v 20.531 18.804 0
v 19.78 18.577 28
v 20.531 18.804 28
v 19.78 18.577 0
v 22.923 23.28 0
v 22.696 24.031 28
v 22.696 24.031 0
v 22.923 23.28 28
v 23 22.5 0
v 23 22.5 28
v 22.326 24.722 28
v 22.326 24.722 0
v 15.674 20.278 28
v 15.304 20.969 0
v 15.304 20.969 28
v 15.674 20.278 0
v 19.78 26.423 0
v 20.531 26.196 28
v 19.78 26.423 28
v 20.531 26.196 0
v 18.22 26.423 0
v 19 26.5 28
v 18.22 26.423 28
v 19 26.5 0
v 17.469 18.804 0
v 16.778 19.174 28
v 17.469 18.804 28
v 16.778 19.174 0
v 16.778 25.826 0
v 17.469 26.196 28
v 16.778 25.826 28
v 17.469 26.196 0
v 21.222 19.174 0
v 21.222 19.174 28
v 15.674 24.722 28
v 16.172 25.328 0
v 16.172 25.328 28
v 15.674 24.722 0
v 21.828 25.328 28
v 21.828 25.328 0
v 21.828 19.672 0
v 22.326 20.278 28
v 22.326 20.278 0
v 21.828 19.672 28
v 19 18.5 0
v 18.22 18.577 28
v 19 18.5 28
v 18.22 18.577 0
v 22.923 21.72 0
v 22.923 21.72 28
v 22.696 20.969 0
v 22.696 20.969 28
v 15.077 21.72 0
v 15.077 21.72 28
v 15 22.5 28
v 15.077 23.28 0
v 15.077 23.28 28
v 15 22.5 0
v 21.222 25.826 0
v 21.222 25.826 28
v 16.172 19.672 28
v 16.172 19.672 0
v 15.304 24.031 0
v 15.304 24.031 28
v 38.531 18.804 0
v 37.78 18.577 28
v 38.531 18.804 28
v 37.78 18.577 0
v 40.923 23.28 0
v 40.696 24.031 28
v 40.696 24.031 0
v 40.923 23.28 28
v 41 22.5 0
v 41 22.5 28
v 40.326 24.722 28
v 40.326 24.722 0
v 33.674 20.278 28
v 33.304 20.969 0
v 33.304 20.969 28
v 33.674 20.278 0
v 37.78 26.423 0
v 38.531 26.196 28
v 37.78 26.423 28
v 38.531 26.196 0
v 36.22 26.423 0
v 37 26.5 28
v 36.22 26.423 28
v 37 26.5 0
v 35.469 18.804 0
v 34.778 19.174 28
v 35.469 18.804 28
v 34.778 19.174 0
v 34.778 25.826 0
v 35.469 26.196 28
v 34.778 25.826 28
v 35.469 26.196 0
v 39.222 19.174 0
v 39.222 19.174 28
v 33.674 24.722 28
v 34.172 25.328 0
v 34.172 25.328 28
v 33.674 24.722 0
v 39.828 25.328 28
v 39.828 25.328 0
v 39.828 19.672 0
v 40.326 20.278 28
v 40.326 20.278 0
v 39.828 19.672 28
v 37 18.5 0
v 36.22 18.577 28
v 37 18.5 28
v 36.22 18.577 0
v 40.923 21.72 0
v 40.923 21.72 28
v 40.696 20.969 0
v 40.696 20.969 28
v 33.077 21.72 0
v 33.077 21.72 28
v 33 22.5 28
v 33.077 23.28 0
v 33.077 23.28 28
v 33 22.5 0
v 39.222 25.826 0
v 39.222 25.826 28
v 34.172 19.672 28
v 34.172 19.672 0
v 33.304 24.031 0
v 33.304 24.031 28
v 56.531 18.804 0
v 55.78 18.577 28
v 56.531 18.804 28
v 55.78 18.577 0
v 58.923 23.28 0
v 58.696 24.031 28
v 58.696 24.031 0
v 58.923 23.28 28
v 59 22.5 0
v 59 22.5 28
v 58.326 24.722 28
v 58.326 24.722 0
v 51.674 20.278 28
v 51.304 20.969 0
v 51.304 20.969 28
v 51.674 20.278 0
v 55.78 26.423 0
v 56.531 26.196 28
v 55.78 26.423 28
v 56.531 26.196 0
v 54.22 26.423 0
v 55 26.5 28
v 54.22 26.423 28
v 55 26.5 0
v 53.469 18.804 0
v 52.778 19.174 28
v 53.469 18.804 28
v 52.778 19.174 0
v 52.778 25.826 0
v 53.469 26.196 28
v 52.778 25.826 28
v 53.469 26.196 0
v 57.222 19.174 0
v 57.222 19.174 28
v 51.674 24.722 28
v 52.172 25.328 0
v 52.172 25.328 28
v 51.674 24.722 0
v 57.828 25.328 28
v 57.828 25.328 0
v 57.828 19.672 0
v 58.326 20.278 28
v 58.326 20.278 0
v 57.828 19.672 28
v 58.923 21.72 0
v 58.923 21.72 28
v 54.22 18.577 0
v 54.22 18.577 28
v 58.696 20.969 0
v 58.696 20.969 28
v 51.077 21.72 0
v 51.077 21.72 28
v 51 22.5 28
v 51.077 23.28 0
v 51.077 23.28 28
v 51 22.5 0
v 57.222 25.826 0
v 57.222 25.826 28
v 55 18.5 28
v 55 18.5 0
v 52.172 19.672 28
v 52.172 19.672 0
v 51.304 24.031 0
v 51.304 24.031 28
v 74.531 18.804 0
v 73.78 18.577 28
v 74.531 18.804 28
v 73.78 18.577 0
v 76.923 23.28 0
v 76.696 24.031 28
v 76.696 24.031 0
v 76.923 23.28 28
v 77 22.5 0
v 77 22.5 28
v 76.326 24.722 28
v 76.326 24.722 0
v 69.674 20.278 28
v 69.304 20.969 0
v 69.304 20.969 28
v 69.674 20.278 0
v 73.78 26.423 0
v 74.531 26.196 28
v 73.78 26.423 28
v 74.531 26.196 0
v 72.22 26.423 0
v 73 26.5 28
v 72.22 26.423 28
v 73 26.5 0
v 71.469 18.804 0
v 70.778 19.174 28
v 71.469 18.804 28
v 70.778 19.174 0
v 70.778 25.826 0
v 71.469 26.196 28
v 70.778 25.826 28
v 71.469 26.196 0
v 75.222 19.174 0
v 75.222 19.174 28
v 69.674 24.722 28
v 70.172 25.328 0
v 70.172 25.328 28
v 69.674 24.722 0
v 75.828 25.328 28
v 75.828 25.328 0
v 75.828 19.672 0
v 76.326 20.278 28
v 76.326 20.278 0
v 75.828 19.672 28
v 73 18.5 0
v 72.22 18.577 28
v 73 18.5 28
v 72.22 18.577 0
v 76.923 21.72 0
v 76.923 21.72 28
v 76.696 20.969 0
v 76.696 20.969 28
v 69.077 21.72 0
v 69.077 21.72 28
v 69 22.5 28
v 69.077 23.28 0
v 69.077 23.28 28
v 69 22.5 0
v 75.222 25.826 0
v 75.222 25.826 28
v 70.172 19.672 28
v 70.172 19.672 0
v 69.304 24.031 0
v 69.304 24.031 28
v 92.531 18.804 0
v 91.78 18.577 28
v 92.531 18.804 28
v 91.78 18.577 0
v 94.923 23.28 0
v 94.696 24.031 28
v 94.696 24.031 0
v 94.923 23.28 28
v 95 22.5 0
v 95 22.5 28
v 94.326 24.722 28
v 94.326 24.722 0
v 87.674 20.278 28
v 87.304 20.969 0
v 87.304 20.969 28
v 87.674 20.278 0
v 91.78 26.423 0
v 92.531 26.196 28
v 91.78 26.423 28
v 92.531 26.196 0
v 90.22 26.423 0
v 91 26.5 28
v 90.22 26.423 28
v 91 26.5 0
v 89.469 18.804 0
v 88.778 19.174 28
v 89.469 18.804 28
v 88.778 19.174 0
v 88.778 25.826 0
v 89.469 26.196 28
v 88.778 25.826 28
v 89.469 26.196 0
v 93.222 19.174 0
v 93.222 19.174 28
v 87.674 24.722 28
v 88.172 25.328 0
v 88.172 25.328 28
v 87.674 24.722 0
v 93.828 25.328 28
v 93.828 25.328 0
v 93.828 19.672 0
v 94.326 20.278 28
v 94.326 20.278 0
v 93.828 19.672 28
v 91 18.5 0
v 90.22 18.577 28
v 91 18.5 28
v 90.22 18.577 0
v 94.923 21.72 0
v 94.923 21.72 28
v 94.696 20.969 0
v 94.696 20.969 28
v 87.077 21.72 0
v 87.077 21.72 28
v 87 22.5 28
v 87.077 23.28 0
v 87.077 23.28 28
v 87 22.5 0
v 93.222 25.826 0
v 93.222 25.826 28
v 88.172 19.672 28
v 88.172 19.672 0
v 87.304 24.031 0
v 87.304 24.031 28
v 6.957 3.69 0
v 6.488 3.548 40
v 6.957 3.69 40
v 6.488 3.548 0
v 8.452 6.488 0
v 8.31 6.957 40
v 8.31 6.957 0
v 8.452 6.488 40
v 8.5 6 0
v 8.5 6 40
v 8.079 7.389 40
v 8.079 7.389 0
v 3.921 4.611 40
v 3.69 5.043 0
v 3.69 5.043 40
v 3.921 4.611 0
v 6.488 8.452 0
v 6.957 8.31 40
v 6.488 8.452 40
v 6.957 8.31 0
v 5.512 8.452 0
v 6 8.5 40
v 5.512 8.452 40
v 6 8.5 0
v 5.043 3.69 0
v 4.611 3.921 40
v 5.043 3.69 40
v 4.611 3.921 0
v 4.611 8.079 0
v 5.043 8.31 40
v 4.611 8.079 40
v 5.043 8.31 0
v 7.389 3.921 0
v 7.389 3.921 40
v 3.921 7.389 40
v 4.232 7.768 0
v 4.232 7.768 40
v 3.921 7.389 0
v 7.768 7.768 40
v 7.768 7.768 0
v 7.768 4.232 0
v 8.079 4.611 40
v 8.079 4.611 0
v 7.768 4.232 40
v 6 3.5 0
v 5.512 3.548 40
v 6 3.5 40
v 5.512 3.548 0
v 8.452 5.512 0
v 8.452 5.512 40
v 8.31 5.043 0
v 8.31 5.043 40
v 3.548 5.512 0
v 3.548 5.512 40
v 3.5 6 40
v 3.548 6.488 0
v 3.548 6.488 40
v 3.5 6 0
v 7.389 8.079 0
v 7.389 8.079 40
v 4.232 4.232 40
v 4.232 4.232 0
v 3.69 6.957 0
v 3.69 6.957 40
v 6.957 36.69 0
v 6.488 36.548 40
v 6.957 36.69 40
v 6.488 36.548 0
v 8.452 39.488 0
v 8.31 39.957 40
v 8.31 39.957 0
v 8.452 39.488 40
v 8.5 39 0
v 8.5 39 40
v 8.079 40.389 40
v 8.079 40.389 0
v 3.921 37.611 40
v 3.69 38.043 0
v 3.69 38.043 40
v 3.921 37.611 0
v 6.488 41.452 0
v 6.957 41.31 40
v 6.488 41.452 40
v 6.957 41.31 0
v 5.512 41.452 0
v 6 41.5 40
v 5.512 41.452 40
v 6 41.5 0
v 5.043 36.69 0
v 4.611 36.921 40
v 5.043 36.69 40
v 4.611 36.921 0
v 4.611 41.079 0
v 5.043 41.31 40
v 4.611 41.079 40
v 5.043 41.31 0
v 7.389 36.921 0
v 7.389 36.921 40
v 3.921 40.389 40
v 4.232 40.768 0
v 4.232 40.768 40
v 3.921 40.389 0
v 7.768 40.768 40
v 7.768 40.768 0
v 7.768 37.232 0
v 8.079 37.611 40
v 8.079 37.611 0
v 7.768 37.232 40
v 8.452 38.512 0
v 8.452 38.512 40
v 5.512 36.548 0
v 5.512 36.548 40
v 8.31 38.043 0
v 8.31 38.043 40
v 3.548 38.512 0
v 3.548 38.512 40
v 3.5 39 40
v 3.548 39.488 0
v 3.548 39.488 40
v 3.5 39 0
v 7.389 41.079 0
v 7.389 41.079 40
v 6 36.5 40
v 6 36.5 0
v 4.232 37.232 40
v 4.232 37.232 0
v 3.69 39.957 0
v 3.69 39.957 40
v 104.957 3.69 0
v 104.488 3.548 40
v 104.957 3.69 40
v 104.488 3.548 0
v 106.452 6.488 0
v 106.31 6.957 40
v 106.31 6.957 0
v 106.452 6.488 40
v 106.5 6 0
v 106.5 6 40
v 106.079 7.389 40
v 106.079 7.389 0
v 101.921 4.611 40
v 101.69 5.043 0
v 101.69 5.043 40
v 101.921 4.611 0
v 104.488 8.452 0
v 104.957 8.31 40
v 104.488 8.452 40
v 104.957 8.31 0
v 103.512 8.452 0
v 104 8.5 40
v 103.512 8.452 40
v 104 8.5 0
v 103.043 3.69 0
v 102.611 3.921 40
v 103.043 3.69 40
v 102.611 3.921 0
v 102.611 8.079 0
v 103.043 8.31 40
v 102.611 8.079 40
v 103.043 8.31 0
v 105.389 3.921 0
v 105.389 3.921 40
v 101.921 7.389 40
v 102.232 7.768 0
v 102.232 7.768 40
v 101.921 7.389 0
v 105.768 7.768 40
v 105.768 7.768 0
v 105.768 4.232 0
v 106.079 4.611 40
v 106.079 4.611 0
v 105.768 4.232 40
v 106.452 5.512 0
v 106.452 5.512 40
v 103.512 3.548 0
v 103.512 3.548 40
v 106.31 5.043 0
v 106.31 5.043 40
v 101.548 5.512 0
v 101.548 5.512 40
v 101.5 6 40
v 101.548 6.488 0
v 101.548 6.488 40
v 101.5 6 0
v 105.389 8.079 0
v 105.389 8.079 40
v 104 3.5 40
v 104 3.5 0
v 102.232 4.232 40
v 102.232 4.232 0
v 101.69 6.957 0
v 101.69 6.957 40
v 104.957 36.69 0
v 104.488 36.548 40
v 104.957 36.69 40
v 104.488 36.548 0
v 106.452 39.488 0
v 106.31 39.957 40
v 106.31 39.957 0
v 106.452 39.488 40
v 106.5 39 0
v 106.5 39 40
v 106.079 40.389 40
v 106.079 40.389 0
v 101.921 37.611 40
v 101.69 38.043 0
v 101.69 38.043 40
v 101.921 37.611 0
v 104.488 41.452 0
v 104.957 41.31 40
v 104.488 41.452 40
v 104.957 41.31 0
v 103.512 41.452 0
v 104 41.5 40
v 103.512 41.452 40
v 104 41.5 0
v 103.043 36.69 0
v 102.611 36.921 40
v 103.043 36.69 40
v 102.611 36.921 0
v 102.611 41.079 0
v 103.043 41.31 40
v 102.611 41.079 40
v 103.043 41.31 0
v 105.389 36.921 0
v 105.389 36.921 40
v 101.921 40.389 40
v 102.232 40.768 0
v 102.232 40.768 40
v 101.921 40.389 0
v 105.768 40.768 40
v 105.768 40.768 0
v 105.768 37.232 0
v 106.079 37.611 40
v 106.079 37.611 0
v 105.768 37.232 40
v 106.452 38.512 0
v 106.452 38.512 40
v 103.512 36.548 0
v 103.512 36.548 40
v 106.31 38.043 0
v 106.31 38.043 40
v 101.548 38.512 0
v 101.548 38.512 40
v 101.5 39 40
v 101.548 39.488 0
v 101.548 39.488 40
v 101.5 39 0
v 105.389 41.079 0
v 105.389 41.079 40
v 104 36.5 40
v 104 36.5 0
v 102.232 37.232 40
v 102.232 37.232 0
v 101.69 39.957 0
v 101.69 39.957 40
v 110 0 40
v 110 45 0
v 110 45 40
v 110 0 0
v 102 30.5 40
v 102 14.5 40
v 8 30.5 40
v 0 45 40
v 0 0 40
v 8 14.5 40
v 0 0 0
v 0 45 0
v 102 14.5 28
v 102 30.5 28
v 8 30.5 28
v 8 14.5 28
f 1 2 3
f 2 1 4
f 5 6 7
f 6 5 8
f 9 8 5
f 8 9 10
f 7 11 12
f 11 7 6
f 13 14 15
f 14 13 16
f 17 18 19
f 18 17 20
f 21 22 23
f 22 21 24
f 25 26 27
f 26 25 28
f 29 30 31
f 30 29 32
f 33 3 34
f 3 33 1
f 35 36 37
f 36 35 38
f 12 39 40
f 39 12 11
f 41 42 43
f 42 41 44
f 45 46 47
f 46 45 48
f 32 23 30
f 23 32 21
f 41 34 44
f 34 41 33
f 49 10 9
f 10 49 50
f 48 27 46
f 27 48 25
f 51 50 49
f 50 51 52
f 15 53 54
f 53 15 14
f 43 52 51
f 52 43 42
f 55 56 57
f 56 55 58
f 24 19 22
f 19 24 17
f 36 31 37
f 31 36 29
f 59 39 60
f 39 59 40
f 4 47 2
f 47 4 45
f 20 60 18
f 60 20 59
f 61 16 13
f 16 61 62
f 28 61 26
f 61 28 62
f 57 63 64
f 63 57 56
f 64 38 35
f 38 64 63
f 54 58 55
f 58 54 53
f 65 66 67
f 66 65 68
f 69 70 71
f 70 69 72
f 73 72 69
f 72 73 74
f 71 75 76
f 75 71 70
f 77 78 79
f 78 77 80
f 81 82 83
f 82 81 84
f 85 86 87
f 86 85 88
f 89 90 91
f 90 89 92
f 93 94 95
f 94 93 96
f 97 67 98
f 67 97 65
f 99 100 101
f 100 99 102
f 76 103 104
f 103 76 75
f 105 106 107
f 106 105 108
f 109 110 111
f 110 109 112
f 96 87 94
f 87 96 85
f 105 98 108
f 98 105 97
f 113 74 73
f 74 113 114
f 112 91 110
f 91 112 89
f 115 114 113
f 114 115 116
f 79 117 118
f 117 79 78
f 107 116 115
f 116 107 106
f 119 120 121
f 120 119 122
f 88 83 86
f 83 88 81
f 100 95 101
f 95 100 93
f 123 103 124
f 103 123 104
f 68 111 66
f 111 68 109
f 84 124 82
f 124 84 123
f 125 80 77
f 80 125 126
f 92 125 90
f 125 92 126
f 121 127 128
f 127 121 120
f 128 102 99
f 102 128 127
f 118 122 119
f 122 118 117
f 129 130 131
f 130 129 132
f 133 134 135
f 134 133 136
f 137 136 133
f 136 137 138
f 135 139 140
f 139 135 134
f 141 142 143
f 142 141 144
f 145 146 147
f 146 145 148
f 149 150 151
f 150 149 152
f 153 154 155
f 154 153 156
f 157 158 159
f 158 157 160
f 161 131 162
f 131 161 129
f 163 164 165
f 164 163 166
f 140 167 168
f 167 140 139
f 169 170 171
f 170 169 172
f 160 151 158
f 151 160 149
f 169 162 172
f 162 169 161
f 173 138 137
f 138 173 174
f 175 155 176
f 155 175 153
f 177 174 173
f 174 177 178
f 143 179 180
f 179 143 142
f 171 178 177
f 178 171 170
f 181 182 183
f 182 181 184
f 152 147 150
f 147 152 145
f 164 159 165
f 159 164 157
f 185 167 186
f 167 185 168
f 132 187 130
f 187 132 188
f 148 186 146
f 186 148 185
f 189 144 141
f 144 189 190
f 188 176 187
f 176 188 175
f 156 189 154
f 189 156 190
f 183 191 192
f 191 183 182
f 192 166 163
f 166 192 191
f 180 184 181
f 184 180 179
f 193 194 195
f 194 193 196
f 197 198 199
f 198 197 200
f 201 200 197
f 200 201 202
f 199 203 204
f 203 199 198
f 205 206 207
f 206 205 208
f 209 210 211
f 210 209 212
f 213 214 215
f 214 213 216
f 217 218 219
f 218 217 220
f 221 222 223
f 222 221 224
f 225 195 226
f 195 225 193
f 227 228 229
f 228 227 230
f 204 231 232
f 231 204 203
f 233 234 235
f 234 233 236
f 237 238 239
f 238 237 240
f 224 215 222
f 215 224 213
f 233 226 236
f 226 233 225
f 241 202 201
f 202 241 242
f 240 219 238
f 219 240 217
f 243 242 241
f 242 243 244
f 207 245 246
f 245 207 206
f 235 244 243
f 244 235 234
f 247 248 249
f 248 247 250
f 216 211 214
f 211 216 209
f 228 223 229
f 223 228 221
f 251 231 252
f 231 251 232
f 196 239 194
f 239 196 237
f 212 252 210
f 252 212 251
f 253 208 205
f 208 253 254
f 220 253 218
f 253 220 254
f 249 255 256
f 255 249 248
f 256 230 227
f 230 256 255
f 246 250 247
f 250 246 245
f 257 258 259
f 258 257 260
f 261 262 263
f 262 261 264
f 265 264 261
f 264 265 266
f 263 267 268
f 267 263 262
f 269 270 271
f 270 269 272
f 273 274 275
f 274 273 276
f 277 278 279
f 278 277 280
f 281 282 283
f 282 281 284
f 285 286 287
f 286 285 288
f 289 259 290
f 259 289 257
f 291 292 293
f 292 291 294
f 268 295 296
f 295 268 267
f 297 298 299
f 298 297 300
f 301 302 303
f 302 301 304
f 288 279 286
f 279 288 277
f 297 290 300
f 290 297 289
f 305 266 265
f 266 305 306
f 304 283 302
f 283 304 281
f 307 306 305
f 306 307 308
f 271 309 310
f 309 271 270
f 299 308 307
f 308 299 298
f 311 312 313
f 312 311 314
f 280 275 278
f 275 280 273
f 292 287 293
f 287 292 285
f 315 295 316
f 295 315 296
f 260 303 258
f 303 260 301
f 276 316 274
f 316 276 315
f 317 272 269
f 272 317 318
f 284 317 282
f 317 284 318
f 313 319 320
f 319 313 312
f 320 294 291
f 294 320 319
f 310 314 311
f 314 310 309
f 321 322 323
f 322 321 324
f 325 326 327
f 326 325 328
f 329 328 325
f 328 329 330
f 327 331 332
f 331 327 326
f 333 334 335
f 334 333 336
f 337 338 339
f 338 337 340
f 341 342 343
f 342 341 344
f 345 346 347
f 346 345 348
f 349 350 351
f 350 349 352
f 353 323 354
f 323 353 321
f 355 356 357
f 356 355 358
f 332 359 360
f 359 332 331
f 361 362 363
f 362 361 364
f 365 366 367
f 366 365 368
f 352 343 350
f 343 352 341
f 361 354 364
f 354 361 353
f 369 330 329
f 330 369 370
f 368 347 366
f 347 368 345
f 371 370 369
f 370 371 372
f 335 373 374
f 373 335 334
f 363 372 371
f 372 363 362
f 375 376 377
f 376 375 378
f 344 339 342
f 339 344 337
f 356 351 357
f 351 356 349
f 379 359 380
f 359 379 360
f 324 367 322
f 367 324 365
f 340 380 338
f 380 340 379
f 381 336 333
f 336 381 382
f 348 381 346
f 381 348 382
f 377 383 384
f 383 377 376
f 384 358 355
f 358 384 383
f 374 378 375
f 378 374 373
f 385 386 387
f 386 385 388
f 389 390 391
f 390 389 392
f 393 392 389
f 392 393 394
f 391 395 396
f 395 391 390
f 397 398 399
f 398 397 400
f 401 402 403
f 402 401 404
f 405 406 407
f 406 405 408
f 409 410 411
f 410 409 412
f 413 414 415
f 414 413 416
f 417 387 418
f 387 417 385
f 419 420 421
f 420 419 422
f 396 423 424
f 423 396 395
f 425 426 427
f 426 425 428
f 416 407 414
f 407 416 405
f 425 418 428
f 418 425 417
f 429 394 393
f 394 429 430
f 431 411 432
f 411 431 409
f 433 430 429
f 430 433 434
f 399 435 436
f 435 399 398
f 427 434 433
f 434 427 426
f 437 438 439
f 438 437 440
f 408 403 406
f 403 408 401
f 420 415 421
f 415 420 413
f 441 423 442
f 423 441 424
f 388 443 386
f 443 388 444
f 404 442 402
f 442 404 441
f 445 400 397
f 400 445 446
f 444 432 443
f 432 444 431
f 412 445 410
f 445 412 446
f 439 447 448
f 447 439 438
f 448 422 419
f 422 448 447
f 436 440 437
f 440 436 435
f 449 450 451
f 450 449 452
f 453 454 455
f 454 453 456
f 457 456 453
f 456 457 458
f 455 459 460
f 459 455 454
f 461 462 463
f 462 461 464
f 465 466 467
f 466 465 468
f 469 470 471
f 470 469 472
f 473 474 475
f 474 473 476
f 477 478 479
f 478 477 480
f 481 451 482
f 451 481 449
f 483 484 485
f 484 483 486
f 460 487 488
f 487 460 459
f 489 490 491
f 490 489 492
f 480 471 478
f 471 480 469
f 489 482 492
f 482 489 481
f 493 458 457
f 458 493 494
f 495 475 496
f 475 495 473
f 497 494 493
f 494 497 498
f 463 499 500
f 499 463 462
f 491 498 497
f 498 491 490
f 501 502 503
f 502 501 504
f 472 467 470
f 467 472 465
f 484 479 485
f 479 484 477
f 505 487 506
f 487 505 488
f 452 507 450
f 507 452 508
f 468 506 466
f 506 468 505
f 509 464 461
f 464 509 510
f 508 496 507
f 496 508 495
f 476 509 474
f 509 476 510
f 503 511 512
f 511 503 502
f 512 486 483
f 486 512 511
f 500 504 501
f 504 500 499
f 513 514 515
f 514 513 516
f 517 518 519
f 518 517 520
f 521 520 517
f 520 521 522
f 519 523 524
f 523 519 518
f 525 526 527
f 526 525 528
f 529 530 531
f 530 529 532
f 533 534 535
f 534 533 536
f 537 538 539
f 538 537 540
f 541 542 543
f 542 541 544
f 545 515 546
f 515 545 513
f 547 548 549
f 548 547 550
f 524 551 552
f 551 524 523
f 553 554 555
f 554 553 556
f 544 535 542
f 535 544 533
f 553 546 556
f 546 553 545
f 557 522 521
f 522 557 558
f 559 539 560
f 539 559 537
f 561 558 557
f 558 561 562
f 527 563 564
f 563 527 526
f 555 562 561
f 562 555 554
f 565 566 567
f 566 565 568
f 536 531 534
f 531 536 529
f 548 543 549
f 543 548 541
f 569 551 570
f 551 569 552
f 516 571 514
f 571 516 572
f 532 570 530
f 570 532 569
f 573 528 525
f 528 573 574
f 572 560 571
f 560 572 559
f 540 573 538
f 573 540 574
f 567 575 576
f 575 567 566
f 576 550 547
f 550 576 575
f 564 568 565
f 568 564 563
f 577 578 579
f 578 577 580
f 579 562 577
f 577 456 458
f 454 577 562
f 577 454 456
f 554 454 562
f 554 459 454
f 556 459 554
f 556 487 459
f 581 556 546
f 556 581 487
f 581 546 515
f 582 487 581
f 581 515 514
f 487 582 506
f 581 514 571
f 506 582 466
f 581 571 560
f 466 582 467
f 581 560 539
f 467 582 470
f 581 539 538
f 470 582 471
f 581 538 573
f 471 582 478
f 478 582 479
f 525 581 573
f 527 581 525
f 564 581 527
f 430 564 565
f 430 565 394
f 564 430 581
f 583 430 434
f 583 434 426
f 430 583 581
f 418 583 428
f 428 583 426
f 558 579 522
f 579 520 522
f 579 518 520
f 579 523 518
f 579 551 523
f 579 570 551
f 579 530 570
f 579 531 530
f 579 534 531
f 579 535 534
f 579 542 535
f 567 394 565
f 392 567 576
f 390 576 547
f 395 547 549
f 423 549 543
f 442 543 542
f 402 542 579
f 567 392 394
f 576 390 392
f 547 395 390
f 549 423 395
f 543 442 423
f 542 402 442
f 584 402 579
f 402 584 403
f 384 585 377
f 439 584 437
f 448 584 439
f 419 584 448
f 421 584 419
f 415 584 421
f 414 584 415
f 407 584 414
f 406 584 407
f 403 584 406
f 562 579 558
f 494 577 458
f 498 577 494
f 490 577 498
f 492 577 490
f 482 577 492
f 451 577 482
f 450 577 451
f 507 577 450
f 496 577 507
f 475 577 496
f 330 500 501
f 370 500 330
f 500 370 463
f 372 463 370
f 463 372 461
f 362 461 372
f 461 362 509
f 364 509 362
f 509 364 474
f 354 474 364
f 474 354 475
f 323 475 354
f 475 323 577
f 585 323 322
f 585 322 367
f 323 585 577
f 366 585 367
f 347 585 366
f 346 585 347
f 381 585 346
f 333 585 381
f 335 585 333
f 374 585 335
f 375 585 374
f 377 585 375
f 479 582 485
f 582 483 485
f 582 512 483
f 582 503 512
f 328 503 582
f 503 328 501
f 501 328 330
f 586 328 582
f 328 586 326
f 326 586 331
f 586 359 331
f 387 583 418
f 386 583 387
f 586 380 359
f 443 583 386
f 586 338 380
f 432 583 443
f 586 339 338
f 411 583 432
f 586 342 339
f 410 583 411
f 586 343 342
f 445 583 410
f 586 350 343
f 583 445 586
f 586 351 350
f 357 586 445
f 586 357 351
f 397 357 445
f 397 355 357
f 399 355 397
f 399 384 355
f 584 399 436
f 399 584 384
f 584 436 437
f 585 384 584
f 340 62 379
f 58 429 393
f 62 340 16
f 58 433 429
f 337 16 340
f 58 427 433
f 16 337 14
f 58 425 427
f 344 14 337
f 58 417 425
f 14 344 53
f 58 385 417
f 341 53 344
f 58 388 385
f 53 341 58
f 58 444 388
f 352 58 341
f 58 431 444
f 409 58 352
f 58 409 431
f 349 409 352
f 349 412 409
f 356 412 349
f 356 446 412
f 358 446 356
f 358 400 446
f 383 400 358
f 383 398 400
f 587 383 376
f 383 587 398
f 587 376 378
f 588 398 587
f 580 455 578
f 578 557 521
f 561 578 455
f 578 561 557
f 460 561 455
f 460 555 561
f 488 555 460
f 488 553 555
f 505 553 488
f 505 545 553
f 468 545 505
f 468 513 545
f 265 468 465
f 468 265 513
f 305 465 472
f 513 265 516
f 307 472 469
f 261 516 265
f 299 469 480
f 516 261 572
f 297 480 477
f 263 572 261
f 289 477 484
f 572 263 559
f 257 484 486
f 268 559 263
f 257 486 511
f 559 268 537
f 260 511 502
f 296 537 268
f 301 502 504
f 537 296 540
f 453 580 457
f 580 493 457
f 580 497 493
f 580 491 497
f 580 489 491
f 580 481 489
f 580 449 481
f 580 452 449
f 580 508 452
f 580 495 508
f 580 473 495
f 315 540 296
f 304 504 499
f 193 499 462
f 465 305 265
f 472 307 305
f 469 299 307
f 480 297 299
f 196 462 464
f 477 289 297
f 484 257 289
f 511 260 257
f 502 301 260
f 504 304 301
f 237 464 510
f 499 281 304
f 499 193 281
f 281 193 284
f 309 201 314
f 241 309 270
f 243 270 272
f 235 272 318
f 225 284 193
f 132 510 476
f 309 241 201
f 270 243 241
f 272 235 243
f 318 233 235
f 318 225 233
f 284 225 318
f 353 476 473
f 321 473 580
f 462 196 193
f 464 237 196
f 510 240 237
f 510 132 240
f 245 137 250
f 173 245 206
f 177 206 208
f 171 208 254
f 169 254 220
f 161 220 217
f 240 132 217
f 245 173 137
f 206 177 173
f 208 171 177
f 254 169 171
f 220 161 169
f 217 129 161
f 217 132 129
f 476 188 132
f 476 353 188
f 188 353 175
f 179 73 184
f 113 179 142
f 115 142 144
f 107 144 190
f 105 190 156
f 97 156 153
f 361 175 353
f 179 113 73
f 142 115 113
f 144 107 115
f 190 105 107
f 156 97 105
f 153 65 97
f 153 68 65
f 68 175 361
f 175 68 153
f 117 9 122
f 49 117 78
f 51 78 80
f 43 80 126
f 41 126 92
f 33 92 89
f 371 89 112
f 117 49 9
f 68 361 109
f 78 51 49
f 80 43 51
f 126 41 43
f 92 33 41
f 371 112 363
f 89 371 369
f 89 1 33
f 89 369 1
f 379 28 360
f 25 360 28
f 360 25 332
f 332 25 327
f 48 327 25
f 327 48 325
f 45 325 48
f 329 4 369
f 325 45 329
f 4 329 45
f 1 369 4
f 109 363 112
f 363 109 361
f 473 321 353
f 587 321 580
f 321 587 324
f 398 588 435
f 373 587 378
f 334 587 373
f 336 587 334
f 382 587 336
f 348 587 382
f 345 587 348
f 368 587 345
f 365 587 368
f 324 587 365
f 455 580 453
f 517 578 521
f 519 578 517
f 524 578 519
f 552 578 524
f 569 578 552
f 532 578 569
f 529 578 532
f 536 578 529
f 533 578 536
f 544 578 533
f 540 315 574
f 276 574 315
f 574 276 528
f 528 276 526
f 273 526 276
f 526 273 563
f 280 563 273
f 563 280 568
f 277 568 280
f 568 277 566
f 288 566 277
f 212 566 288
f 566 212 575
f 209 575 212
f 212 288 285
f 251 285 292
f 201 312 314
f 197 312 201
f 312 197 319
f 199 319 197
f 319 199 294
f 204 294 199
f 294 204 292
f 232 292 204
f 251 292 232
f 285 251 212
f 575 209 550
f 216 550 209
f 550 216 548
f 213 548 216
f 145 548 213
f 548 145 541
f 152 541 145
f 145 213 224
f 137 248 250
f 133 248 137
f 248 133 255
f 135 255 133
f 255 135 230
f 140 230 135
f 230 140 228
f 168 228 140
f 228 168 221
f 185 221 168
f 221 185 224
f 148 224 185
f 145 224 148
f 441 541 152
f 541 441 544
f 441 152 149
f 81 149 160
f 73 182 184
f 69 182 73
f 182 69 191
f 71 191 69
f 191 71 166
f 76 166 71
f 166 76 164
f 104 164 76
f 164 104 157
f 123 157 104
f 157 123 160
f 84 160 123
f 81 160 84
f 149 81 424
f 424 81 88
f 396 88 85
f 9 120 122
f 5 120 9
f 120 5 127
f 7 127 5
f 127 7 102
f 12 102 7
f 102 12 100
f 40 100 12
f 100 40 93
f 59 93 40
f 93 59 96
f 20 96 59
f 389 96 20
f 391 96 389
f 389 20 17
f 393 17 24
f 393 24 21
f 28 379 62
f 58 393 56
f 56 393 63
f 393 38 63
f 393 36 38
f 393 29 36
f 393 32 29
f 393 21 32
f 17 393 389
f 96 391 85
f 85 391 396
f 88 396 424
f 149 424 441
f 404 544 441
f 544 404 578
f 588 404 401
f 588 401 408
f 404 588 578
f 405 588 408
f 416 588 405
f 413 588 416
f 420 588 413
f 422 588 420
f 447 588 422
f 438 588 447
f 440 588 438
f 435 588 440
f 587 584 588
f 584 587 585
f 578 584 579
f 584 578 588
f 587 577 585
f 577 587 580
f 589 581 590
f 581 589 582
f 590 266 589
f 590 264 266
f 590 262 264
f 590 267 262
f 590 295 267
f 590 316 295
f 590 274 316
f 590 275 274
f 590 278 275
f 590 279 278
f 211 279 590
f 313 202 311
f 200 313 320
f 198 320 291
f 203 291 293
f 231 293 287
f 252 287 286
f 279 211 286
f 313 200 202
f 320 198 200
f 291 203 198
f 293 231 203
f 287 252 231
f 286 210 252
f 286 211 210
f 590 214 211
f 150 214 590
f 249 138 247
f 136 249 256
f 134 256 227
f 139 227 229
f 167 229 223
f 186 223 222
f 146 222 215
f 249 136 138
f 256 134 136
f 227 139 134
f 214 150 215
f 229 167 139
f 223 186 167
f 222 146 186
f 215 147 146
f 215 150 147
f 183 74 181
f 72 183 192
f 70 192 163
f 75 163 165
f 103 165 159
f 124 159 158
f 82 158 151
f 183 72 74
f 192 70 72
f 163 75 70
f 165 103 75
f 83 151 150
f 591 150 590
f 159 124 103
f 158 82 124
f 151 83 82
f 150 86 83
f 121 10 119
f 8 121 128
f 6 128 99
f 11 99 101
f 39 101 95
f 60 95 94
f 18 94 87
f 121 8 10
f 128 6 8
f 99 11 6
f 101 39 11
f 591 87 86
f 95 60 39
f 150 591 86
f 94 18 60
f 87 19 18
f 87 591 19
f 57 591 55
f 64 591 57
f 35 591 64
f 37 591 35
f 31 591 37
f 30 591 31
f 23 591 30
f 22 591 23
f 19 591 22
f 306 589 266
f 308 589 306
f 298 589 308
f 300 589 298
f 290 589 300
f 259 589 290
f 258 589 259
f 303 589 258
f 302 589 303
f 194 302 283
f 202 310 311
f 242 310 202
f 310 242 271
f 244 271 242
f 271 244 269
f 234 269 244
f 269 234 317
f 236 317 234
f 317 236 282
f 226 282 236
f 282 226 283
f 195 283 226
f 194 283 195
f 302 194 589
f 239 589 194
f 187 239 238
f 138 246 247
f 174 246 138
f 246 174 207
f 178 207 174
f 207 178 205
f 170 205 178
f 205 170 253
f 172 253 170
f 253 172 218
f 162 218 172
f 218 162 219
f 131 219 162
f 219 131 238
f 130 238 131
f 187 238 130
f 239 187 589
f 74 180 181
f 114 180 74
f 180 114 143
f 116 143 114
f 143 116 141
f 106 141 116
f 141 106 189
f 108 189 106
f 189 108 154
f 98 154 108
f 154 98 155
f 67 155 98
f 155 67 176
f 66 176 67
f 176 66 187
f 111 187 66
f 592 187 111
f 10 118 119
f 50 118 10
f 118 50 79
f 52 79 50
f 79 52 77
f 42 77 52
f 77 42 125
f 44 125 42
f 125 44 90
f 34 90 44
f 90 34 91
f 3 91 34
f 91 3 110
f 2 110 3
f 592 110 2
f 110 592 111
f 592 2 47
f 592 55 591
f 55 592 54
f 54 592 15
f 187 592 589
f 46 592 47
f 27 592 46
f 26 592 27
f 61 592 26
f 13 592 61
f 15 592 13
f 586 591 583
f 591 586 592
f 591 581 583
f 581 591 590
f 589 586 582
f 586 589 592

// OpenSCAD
$fn = 32;

// ----------------------------------------------------------------------
// Manifold block: gallery_top manifold
// ----------------------------------------------------------------------

// --- parameters (mm) ---
block_l = 110;            // block length, X
block_w = 45;             // block width, Y
block_h = 40;             // block height, Z
port_d = 8;               // port bore diameter
port_pitch = 18;          // port pitch along X
gallery_d = 16;           // top gallery width, Y
gallery_depth = 12;       // gallery pocket depth
wall_p = 8;               // gallery end wall thickness, X
mnt_d = 5;                // mounting hole diameter
mnt_in = 6;               // mounting hole inset from the edges
fit_tol = 0.05;           // tolerance for press fits, mm
free_tol = 0.2;           // tolerance for clearance fits, mm

n_ports = 5;  // ports in the row
port_x0 = (block_l - (n_ports - 1) * port_pitch) / 2;  // first port X

difference() {
  cube([block_l, block_w, block_h]);
  for (i = [0 : n_ports - 1])
    translate([port_x0 + i * port_pitch, block_w / 2, -1])
      cylinder(h = block_h + 2, d = port_d);
  translate([wall_p, block_w / 2 - gallery_d / 2, block_h - gallery_depth])
    cube([block_l - 2 * wall_p, gallery_d, gallery_depth + 1]);
  for (cx = [mnt_in, block_l - mnt_in])
    for (cy = [mnt_in, block_w - mnt_in])
      translate([cx, cy, -1]) cylinder(h = block_h + 2, d = mnt_d);
}
